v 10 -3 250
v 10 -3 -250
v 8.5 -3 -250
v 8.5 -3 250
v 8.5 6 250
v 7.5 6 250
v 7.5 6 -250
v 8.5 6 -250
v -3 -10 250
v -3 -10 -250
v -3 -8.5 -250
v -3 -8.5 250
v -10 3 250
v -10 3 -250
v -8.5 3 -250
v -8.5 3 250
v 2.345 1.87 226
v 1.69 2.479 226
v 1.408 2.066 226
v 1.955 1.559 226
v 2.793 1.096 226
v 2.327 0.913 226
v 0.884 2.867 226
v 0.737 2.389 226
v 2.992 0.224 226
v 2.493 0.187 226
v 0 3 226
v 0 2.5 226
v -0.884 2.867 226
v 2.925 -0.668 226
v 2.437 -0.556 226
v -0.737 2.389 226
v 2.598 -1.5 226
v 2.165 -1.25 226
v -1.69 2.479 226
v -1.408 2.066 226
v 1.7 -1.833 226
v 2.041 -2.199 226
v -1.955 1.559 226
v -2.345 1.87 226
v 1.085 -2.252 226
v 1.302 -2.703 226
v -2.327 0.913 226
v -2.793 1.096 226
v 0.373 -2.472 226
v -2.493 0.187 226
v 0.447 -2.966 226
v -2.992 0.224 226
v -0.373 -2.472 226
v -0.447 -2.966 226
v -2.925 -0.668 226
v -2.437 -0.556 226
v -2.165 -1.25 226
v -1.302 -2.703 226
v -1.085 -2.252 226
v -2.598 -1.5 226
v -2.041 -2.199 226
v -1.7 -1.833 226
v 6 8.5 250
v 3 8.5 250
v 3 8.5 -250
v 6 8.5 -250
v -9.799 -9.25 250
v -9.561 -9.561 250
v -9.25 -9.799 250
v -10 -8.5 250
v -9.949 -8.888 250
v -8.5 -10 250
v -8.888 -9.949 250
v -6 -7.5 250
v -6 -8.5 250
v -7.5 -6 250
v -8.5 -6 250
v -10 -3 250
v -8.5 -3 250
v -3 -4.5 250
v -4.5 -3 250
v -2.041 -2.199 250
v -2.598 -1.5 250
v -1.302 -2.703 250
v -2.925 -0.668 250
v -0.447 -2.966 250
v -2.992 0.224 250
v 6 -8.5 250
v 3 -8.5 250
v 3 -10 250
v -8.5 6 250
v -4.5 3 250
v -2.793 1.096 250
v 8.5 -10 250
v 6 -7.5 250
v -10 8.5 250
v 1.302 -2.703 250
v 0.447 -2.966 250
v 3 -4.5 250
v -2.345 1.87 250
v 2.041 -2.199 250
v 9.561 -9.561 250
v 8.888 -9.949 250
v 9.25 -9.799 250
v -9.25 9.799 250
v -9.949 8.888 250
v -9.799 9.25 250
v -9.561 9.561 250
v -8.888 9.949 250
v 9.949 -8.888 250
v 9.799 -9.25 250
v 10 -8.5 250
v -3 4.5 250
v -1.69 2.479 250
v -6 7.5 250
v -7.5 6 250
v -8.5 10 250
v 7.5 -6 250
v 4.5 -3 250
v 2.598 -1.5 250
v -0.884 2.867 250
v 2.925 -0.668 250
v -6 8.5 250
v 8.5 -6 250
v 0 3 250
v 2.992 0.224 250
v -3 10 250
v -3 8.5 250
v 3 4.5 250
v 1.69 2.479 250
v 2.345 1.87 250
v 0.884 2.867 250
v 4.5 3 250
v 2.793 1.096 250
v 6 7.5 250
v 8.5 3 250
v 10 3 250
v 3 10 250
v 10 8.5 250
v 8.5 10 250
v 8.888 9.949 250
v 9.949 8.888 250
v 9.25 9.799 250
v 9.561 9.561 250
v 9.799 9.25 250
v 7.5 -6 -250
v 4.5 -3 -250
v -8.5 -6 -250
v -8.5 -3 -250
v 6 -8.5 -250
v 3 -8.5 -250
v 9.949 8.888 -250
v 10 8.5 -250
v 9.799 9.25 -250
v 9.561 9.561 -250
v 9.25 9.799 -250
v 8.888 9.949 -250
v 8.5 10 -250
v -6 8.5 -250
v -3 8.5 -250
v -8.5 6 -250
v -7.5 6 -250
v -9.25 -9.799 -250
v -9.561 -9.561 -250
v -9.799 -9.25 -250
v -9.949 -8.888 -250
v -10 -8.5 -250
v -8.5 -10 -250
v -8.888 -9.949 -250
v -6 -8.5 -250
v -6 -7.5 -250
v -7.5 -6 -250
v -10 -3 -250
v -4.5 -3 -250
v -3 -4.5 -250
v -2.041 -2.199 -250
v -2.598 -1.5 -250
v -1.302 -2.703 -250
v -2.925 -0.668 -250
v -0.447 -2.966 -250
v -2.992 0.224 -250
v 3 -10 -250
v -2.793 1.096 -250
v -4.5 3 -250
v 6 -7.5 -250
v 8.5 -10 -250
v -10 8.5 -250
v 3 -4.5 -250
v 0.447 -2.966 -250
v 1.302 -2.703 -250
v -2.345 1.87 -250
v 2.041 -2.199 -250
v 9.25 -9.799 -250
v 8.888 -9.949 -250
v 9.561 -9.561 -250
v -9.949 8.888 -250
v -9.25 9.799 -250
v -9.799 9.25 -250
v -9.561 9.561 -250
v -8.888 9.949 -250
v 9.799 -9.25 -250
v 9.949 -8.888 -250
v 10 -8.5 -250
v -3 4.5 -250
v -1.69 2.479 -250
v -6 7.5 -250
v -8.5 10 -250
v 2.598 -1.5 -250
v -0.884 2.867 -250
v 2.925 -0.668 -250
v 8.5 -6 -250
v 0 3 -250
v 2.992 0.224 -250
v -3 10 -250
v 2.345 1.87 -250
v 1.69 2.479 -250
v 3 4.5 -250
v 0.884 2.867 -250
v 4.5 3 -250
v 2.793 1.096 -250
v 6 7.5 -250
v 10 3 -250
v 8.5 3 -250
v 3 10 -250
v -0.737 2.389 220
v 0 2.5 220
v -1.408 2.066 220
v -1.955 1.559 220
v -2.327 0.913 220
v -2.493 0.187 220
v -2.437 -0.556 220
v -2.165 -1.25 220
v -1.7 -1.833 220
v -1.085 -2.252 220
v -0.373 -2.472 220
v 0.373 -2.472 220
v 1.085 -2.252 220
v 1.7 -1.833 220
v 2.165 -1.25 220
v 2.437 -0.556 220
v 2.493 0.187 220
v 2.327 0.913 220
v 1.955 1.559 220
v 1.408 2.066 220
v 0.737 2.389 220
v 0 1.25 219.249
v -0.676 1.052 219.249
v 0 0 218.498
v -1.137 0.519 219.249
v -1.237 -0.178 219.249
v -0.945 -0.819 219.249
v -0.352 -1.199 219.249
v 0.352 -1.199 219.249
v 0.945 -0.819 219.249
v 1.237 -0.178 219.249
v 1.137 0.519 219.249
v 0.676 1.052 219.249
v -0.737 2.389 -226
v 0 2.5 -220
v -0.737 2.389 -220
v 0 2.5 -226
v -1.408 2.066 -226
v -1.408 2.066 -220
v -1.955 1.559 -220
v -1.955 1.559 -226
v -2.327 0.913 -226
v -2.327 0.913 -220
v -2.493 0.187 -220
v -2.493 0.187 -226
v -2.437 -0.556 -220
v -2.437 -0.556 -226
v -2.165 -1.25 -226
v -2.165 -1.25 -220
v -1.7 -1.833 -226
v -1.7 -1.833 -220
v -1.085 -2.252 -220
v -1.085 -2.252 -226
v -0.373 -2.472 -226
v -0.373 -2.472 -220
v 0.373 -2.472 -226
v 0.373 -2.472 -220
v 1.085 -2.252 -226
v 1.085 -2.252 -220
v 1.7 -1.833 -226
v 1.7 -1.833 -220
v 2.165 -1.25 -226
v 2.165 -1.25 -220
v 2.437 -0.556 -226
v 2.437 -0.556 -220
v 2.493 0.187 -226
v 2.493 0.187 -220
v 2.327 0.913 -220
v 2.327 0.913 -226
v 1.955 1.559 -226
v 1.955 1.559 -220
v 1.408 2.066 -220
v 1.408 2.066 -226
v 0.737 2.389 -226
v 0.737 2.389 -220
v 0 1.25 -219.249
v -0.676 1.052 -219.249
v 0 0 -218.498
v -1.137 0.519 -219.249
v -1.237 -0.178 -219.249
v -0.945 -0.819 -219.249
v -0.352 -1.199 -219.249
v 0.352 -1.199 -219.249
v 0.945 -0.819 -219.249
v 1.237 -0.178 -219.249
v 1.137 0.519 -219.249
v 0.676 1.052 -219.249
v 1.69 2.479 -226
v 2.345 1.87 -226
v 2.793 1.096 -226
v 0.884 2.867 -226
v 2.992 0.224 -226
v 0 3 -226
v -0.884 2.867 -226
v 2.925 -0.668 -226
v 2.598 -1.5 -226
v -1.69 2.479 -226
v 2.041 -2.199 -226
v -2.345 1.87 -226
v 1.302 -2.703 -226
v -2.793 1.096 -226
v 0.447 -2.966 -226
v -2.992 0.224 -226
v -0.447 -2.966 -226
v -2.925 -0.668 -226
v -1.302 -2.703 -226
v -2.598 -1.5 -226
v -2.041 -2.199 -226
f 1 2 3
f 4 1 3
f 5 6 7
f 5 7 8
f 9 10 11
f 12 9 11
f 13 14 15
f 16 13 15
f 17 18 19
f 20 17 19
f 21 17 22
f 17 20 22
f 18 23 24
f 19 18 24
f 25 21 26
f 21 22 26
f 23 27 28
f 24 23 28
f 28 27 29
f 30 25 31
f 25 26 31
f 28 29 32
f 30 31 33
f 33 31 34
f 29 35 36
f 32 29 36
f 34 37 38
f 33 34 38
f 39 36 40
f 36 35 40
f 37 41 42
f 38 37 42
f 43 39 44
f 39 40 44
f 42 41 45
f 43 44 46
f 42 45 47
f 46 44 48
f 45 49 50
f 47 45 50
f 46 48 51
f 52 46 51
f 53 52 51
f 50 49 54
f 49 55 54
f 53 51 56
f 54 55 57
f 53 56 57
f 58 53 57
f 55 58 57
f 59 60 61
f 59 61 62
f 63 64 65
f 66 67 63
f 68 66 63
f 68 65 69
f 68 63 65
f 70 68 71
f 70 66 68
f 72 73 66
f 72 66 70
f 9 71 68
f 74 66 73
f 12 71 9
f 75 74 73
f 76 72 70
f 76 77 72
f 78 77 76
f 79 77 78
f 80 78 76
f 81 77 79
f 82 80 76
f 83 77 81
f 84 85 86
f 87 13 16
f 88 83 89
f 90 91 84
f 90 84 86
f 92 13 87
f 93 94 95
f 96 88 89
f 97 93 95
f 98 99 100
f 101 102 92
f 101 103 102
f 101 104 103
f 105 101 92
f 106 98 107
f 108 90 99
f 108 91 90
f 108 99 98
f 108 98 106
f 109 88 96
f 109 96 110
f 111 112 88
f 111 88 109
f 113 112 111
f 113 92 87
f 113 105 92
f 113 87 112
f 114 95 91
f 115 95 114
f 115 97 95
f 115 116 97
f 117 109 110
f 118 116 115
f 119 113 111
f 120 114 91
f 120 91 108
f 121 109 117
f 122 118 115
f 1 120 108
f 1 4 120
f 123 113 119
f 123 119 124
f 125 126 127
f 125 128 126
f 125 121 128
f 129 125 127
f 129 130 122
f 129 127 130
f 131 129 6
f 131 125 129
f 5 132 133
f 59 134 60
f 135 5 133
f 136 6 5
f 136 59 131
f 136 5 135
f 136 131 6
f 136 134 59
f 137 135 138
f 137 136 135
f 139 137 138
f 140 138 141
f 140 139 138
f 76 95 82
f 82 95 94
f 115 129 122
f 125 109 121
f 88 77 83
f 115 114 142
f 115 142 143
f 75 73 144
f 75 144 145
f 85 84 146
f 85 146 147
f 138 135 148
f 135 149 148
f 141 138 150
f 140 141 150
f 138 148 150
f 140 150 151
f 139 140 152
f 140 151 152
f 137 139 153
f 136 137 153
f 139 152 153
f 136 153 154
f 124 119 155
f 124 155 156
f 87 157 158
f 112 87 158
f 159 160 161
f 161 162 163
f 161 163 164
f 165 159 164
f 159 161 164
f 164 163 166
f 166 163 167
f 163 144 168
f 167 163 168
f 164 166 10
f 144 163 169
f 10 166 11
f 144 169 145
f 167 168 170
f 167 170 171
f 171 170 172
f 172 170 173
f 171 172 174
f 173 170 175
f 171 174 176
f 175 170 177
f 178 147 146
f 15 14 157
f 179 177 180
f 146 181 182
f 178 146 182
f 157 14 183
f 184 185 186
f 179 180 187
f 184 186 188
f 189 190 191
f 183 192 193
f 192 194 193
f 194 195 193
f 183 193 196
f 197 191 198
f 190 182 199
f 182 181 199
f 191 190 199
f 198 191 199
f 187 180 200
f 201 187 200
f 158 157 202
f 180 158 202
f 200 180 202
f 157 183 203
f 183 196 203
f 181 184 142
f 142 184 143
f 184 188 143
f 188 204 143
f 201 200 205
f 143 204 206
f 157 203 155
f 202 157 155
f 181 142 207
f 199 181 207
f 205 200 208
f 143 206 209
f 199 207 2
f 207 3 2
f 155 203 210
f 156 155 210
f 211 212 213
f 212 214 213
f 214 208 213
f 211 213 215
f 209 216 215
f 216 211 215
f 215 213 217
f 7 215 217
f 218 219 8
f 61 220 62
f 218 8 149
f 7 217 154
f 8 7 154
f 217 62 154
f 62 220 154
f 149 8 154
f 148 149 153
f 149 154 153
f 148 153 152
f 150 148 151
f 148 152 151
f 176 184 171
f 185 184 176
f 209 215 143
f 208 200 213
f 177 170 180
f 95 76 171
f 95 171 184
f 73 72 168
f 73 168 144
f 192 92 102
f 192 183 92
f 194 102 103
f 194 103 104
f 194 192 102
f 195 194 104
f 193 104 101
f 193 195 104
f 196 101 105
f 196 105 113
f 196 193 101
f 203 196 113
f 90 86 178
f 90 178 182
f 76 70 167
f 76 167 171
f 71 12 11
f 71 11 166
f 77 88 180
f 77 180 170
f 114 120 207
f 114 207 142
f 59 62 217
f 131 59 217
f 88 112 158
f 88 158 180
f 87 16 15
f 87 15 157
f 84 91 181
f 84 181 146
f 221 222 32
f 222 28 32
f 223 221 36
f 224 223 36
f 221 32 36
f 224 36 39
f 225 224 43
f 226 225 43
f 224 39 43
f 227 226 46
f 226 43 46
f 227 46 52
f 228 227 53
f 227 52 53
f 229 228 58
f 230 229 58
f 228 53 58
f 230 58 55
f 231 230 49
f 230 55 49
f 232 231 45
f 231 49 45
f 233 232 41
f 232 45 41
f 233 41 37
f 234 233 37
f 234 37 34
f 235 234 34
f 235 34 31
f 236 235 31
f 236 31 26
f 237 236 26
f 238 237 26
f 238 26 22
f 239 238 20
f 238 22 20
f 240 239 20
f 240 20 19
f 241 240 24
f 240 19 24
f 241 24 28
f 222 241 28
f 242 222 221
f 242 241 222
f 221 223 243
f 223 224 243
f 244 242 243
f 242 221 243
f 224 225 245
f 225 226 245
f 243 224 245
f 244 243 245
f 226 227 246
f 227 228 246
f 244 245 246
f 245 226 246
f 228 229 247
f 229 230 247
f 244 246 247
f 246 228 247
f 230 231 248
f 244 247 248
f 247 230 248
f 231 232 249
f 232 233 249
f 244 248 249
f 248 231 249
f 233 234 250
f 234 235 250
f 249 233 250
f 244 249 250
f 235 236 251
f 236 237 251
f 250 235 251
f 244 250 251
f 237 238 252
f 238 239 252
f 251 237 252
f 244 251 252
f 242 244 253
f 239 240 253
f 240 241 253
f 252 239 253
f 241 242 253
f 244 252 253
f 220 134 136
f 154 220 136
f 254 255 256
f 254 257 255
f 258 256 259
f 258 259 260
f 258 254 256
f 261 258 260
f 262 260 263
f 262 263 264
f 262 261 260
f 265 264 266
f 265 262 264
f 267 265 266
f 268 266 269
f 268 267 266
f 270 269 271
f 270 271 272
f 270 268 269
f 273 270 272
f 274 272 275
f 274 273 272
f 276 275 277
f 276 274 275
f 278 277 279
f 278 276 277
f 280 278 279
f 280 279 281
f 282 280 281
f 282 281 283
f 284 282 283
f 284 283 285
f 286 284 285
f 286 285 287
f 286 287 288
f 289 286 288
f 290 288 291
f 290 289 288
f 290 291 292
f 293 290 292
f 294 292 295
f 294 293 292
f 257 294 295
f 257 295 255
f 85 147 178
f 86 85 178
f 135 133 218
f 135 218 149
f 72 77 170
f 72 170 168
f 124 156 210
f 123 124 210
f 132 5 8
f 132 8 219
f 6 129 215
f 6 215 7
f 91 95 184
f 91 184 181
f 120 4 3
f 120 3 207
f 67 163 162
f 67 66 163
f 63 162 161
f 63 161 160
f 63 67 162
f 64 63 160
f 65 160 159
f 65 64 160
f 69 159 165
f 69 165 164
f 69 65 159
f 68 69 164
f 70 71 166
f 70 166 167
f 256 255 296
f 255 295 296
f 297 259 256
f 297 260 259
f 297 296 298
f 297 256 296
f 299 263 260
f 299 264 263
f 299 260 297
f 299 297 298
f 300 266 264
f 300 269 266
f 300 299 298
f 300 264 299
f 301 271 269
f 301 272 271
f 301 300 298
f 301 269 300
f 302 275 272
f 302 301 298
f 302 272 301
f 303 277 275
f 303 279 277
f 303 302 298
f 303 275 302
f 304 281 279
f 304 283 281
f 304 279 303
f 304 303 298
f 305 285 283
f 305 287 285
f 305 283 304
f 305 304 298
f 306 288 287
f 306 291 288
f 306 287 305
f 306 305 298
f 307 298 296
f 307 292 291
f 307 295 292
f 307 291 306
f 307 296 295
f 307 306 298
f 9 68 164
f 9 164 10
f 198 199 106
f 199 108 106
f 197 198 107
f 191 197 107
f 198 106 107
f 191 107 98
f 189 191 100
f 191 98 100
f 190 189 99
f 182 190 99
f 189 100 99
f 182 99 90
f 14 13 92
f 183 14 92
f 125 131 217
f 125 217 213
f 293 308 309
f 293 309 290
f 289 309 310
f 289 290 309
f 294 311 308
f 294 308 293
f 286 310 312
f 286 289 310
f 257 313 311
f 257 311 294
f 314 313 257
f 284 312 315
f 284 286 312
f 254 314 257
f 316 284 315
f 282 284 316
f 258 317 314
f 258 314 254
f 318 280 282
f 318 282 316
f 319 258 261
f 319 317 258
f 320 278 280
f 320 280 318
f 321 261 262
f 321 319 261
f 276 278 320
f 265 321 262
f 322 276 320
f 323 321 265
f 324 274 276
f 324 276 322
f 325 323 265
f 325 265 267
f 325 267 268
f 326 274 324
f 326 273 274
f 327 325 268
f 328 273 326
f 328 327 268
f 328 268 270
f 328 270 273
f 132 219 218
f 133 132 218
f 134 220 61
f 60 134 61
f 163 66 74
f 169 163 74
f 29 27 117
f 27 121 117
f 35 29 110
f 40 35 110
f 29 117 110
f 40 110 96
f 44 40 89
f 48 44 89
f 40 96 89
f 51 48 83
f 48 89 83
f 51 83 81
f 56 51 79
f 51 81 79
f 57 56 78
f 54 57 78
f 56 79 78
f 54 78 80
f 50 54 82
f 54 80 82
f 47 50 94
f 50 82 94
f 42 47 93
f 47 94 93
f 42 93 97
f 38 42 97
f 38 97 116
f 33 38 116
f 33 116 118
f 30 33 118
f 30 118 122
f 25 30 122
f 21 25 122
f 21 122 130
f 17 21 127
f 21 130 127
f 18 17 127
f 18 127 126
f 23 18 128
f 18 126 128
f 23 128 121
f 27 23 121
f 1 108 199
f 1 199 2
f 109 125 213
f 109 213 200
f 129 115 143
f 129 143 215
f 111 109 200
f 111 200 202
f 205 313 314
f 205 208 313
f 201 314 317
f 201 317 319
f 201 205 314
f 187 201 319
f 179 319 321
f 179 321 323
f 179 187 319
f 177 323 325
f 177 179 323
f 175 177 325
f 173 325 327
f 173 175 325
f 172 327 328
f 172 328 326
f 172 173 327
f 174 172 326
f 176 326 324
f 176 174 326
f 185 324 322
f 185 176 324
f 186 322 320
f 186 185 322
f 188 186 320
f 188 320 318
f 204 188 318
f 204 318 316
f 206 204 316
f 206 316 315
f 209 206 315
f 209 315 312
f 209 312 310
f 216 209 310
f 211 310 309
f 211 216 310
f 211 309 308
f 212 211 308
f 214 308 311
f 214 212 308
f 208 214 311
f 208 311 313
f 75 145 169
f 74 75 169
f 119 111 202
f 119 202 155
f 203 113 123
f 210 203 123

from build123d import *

# Parameters (mm, degrees)
ESQUISSE1_W                  = 20
ESQUISSE1_H                  = 20
EXTRUSION1_DEPTH             = 250
CONG_1_R                     = 1.5
ENL_V_MAT_EXTRU_1_DEPTH      = 501.199960016
R_P_TITION_CIRCULAIRE1_COUNT = 4


with BuildPart() as part:
    # Esquisse1 → Extrusion1 (new, symmetric)
    with BuildSketch(Plane.XY):
        Rectangle(ESQUISSE1_W, ESQUISSE1_H)
    extrude(amount=EXTRUSION1_DEPTH, both=True)

    # Congé1
    cong_1_edges = [part.edges().sort_by_distance(p)[0] for p in [
        (-10, -10, 0),
        (10, -10, 0),
        (-10, 10, 0),
        (10, 10, 0),
    ]]
    fillet(cong_1_edges, radius=CONG_1_R)

    # Esquisse2 → Enlèv. mat.-Extru.1 (cut, through all)
    with BuildSketch(Plane(origin=(0, 0, -250), x_dir=(-1, 0, 0), z_dir=(0, 0, -1))):
        Polygon((-10, 3), (-10, -3), (-8.5, -3), (-8.5, -6), (-7.5, -6), (-4.5, -3), (-4.5, 3), (-7.5, 6), (-8.5, 6), (-8.5, 3), align=None)
    enl_v_mat_extru_1 = extrude(amount=-ENL_V_MAT_EXTRU_1_DEPTH, mode=Mode.SUBTRACT)

    # Répétition circulaire1: Enlèv. mat.-Extru.1 ×4 about axis
    r_p_tition_circulaire1_axis = Axis((0, 0, 9.333809512), (0, 0, -1))
    for i in range(1, R_P_TITION_CIRCULAIRE1_COUNT):
        add(enl_v_mat_extru_1.rotate(r_p_tition_circulaire1_axis, i * 360 / R_P_TITION_CIRCULAIRE1_COUNT), mode=Mode.SUBTRACT)

    # Esquisse5 → Trou taraudé M6x1.01 (revolve, cut)
    with BuildSketch(Plane(origin=(0, 0, -250), x_dir=(0, 1, 0), z_dir=(1, 0, 0))):
        Polygon((0, 0), (0, 31.502151548), (2.5, 30), (2.5, 24), (3, 24), (3, 0), align=None)
    trou_taraud_m6x1_01 = revolve(axis=Axis((0, 0, -256.35), (0, 0, 1)), mode=Mode.SUBTRACT)

    # Symétrie1: Trou taraudé M6x1.01 across plane
    add(trou_taraud_m6x1_01.mirror(Plane.XY), mode=Mode.SUBTRACT)


solid = part.part
